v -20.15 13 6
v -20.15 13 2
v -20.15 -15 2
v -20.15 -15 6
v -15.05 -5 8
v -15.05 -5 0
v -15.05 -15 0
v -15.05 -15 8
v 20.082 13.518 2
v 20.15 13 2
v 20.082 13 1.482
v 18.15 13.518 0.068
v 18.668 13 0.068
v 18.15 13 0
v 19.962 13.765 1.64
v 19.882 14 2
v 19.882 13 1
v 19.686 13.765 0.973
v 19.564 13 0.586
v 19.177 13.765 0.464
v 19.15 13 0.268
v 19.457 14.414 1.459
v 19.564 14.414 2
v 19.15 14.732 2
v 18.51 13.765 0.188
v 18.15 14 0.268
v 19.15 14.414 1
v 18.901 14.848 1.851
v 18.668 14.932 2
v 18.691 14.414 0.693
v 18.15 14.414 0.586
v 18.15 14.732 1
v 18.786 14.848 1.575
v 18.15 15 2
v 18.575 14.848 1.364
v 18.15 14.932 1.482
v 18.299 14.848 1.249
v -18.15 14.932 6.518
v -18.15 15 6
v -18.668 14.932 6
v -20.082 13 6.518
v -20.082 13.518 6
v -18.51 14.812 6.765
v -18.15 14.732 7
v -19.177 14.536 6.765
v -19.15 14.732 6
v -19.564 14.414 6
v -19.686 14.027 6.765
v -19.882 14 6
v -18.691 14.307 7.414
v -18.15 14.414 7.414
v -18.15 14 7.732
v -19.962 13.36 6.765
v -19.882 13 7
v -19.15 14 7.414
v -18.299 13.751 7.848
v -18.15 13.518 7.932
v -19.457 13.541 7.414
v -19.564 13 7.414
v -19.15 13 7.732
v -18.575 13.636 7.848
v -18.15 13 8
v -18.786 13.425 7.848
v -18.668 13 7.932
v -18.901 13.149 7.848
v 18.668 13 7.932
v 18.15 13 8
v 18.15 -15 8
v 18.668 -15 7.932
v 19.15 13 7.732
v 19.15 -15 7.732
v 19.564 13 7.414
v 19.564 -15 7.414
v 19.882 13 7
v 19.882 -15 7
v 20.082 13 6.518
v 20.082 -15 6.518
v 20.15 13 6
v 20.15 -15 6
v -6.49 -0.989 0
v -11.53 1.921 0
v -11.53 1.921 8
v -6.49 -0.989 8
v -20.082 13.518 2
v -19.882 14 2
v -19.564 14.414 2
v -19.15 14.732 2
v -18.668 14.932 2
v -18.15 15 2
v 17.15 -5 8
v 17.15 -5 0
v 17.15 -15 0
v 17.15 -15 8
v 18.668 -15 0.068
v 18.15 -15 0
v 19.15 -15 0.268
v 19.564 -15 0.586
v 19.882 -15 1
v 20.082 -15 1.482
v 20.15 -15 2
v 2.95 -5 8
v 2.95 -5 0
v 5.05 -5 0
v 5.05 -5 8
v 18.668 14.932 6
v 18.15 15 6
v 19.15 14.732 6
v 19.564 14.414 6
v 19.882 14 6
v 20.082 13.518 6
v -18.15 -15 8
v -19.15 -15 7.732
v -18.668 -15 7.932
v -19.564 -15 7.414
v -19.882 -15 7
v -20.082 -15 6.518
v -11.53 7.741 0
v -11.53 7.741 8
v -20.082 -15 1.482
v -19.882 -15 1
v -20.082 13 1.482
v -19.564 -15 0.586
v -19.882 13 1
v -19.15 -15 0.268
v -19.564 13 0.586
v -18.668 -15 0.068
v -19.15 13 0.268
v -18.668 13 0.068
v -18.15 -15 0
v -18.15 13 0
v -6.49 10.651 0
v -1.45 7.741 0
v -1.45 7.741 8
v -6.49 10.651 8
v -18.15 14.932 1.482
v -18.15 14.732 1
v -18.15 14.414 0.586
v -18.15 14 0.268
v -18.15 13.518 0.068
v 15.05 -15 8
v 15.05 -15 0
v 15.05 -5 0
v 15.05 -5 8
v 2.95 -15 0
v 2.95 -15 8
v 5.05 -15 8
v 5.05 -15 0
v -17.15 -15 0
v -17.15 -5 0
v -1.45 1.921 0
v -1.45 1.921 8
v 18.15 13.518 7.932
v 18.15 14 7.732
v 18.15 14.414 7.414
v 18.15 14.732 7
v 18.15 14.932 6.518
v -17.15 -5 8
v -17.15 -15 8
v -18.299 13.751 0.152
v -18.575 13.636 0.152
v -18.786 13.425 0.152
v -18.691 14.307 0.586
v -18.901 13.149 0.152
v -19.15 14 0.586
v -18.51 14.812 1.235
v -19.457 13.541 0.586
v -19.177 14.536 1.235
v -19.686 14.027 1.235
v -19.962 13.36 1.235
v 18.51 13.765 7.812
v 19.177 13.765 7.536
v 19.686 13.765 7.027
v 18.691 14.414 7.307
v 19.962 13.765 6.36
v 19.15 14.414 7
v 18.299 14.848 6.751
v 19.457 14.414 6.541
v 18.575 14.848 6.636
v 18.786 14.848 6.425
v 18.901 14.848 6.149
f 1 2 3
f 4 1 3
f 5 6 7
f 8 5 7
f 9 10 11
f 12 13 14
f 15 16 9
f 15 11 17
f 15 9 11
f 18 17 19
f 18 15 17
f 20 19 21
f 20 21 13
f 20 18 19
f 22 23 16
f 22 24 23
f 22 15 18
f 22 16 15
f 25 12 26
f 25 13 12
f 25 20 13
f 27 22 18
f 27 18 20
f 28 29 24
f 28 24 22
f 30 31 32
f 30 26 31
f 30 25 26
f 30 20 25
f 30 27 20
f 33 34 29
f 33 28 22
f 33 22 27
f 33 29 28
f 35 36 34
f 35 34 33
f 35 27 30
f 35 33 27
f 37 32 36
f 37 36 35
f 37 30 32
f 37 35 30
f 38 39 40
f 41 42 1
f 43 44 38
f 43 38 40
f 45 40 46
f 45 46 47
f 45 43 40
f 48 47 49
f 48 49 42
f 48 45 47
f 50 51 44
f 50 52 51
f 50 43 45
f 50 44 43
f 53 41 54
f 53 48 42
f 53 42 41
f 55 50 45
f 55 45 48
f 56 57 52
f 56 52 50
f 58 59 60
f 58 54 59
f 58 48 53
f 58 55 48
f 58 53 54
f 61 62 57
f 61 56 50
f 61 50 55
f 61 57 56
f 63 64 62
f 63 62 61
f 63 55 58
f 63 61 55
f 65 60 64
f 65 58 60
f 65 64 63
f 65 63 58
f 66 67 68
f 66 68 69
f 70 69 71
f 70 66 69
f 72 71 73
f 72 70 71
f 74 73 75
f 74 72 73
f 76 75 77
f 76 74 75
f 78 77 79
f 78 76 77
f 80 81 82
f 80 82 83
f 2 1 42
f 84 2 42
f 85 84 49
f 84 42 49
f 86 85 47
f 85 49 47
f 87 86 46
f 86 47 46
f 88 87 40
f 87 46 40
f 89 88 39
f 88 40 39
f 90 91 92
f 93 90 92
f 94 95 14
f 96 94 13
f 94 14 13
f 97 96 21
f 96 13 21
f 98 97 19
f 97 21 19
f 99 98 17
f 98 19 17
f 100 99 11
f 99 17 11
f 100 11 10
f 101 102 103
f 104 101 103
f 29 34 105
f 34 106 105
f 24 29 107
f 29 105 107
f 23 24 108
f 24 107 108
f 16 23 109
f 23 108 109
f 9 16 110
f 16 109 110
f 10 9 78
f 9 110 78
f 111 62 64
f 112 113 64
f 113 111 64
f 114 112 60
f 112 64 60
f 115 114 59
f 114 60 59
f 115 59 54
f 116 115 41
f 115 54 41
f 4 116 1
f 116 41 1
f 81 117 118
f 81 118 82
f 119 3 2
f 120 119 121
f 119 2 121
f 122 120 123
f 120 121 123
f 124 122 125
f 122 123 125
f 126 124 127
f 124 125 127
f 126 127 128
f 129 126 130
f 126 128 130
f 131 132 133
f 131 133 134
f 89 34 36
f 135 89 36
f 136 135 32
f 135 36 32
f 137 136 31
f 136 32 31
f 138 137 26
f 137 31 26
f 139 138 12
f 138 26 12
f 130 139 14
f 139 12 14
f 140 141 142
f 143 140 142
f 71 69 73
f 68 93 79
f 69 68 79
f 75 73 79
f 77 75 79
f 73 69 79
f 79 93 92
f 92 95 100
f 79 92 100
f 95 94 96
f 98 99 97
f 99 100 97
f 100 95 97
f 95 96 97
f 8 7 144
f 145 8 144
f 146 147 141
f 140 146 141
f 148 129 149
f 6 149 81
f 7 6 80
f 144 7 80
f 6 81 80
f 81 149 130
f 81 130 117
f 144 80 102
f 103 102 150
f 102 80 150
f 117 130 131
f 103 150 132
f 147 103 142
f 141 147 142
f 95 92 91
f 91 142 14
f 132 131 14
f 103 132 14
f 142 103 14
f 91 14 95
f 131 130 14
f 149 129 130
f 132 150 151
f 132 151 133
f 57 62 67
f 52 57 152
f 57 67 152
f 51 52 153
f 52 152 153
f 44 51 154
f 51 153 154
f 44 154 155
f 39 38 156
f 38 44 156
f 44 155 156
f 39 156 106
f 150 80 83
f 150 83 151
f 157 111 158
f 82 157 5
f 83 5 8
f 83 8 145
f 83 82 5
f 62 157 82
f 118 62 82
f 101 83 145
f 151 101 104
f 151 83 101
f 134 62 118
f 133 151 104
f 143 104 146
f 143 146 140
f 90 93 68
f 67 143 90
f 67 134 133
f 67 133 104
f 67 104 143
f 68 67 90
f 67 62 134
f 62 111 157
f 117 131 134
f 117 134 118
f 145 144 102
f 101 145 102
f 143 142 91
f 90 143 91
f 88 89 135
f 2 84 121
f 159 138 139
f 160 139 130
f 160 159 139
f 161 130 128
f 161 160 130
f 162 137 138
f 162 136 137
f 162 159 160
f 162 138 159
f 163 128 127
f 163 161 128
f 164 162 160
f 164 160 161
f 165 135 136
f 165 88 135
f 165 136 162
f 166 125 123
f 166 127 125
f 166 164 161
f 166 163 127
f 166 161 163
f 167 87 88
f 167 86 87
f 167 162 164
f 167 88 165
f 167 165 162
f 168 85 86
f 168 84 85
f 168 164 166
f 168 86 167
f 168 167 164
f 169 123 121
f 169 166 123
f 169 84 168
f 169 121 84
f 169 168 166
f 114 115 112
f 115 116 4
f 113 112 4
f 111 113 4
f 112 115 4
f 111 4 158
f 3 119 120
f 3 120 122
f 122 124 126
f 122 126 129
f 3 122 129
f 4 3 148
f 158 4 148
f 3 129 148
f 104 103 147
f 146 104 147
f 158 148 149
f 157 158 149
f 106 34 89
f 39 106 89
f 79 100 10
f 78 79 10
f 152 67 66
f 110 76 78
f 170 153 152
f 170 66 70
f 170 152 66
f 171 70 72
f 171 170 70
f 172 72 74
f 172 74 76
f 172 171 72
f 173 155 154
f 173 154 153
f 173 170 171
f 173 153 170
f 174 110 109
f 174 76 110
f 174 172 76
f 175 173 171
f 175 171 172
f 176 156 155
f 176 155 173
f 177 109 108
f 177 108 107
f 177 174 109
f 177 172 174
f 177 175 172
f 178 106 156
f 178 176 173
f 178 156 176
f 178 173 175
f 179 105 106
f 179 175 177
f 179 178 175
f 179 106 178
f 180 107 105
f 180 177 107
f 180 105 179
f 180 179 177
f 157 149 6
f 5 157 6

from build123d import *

# Parameters (mm, degrees)
BOSS_EXTRUDE1_DEPTH = 8
FILLET6_R           = 2
FILLET7_R           = 2
FILLET8_R           = 2


with BuildPart() as part:
    # Sketch1 → Boss-Extrude1 (new body)
    with BuildSketch(Plane.XY):
        Polygon((-17.15, -15), (-17.15, -5), (-15.05, -5), (-15.05, -15), (2.95, -15), (2.95, -5), (5.05, -5), (5.05, -15), (15.05, -15), (15.05, -5), (17.15, -5), (17.15, -15), (20.15, -15), (20.15, 15), (-20.15, 15), (-20.15, -15), align=None)
        Polygon((-1.4497978, 7.740960344), (-6.4897978, 10.650805701), (-11.5297978, 7.740960344), (-11.5297978, 1.921269631), (-6.4897978, -0.988575726), (-1.4497978, 1.921269631), align=None, mode=Mode.SUBTRACT)
    extrude(amount=BOSS_EXTRUDE1_DEPTH)

    # Fillet6
    fillet6_edges = [part.edges().sort_by_distance(p)[0] for p in [
        (-20.15, 15, 4),
    ]]
    fillet(fillet6_edges, radius=FILLET6_R)

    # Fillet7
    fillet7_edges = [part.edges().sort_by_distance(p)[0] for p in [
        (20.15, 0, 0),
        (20.15, 15, 4),
        (20.15, 0, 8),
    ]]
    fillet(fillet7_edges, radius=FILLET7_R)

    # Fillet8
    # the kernel refuses this fillet: 2 mm, written as the material it takes off along each edge
    with BuildSketch(Plane(origin=(18.15, 13, 2), x_dir=(0, 0, -1), z_dir=(0, 1, 0))) as fillet8_piece_1_section:
        Polygon((0, 0), (FILLET8_R, 0), (FILLET8_R, -FILLET8_R), (0, -FILLET8_R), align=None)
    fillet8_piece_1 = extrude(amount=FILLET8_R, mode=Mode.PRIVATE)
    fillet8_piece_1 = fillet8_piece_1 - Plane(origin=(18.15, 13, 2), x_dir=(-0.7071067811865475, 0, 0.7071067811865475), z_dir=(0, 1, 0)) * Sphere(FILLET8_R, mode=Mode.PRIVATE)
    add(fillet8_piece_1, mode=Mode.SUBTRACT)
    with BuildSketch(Plane(origin=(18.15, 13, 6), x_dir=(0, 0, 1), z_dir=(0, 1, 0))) as fillet8_piece_2_section:
        Polygon((0, 0), (FILLET8_R, 0), (FILLET8_R, FILLET8_R), (0, FILLET8_R), align=None)
    fillet8_piece_2 = extrude(amount=FILLET8_R, mode=Mode.PRIVATE)
    fillet8_piece_2 = fillet8_piece_2 - Plane(origin=(18.15, 13, 6), x_dir=(-0.7071067811865475, 0, -0.7071067811865475), z_dir=(0, 1, 0)) * Sphere(FILLET8_R, mode=Mode.PRIVATE)
    add(fillet8_piece_2, mode=Mode.SUBTRACT)
    with BuildSketch(Plane(origin=(-20.15, 13, 0), x_dir=(1, 0, 0), z_dir=(0, -1, 0))) as fillet8_piece_3:
        with BuildLine():
            CenterArc((FILLET8_R, FILLET8_R), FILLET8_R, 180, 90)
            Line((0, FILLET8_R), (0, 0))
            Line((0, 0), (FILLET8_R, 0))
        make_face()
    extrude(amount=33, mode=Mode.SUBTRACT)
    with BuildSketch(Plane(origin=(-20.15, 13, 8), x_dir=(1, 0, 0), z_dir=(0, -1, 0))) as fillet8_piece_4:
        with BuildLine():
            CenterArc((FILLET8_R, -FILLET8_R), FILLET8_R, 90, 90)
            Line((0, -FILLET8_R), (0, 0))
            Line((0, 0), (FILLET8_R, 0))
        make_face()
    extrude(amount=33, mode=Mode.SUBTRACT)
    with BuildSketch(Plane(origin=(-18.15, 13, 0), x_dir=(0, 1, 0), z_dir=(1, 0, 0))) as fillet8_piece_5:
        with BuildLine():
            CenterArc((2 - FILLET8_R, FILLET8_R), FILLET8_R, 270, 90)
            Line((2, FILLET8_R), (2, 0))
            Line((2, 0), (2 - FILLET8_R, 0))
        make_face()
    revolve(axis=Axis((-18.15, 13, 0), (0, 0, 1)), revolution_arc=90, mode=Mode.SUBTRACT)
    with BuildSketch(Plane(origin=(-18.15, 13, 8), x_dir=(0, 1, 0), z_dir=(1, 0, 0))) as fillet8_piece_6:
        with BuildLine():
            CenterArc((2 - FILLET8_R, -FILLET8_R), FILLET8_R, 0, 90)
            Line((2 - FILLET8_R, 0), (2, 0))
            Line((2, 0), (2, -FILLET8_R))
        make_face()
    revolve(axis=Axis((-18.15, 13, 8), (0, 0, 1)), revolution_arc=90, mode=Mode.SUBTRACT)
    with BuildSketch(Plane(origin=(18.15, 15, 8), x_dir=(0, 0, -1), z_dir=(-1, 0, 0))) as fillet8_piece_7:
        with BuildLine():
            CenterArc((FILLET8_R, FILLET8_R), FILLET8_R, 180, 90)
            Line((0, FILLET8_R), (0, 0))
            Line((0, 0), (FILLET8_R, 0))
        make_face()
    extrude(amount=36.3, mode=Mode.SUBTRACT)
    with BuildSketch(Plane(origin=(18.15, 15, 0), x_dir=(0, 0, 1), z_dir=(-1, 0, 0))) as fillet8_piece_8:
        with BuildLine():
            CenterArc((FILLET8_R, -FILLET8_R), FILLET8_R, 90, 90)
            Line((0, -FILLET8_R), (0, 0))
            Line((0, 0), (FILLET8_R, 0))
        make_face()
    extrude(amount=36.3, mode=Mode.SUBTRACT)


solid = part.part
